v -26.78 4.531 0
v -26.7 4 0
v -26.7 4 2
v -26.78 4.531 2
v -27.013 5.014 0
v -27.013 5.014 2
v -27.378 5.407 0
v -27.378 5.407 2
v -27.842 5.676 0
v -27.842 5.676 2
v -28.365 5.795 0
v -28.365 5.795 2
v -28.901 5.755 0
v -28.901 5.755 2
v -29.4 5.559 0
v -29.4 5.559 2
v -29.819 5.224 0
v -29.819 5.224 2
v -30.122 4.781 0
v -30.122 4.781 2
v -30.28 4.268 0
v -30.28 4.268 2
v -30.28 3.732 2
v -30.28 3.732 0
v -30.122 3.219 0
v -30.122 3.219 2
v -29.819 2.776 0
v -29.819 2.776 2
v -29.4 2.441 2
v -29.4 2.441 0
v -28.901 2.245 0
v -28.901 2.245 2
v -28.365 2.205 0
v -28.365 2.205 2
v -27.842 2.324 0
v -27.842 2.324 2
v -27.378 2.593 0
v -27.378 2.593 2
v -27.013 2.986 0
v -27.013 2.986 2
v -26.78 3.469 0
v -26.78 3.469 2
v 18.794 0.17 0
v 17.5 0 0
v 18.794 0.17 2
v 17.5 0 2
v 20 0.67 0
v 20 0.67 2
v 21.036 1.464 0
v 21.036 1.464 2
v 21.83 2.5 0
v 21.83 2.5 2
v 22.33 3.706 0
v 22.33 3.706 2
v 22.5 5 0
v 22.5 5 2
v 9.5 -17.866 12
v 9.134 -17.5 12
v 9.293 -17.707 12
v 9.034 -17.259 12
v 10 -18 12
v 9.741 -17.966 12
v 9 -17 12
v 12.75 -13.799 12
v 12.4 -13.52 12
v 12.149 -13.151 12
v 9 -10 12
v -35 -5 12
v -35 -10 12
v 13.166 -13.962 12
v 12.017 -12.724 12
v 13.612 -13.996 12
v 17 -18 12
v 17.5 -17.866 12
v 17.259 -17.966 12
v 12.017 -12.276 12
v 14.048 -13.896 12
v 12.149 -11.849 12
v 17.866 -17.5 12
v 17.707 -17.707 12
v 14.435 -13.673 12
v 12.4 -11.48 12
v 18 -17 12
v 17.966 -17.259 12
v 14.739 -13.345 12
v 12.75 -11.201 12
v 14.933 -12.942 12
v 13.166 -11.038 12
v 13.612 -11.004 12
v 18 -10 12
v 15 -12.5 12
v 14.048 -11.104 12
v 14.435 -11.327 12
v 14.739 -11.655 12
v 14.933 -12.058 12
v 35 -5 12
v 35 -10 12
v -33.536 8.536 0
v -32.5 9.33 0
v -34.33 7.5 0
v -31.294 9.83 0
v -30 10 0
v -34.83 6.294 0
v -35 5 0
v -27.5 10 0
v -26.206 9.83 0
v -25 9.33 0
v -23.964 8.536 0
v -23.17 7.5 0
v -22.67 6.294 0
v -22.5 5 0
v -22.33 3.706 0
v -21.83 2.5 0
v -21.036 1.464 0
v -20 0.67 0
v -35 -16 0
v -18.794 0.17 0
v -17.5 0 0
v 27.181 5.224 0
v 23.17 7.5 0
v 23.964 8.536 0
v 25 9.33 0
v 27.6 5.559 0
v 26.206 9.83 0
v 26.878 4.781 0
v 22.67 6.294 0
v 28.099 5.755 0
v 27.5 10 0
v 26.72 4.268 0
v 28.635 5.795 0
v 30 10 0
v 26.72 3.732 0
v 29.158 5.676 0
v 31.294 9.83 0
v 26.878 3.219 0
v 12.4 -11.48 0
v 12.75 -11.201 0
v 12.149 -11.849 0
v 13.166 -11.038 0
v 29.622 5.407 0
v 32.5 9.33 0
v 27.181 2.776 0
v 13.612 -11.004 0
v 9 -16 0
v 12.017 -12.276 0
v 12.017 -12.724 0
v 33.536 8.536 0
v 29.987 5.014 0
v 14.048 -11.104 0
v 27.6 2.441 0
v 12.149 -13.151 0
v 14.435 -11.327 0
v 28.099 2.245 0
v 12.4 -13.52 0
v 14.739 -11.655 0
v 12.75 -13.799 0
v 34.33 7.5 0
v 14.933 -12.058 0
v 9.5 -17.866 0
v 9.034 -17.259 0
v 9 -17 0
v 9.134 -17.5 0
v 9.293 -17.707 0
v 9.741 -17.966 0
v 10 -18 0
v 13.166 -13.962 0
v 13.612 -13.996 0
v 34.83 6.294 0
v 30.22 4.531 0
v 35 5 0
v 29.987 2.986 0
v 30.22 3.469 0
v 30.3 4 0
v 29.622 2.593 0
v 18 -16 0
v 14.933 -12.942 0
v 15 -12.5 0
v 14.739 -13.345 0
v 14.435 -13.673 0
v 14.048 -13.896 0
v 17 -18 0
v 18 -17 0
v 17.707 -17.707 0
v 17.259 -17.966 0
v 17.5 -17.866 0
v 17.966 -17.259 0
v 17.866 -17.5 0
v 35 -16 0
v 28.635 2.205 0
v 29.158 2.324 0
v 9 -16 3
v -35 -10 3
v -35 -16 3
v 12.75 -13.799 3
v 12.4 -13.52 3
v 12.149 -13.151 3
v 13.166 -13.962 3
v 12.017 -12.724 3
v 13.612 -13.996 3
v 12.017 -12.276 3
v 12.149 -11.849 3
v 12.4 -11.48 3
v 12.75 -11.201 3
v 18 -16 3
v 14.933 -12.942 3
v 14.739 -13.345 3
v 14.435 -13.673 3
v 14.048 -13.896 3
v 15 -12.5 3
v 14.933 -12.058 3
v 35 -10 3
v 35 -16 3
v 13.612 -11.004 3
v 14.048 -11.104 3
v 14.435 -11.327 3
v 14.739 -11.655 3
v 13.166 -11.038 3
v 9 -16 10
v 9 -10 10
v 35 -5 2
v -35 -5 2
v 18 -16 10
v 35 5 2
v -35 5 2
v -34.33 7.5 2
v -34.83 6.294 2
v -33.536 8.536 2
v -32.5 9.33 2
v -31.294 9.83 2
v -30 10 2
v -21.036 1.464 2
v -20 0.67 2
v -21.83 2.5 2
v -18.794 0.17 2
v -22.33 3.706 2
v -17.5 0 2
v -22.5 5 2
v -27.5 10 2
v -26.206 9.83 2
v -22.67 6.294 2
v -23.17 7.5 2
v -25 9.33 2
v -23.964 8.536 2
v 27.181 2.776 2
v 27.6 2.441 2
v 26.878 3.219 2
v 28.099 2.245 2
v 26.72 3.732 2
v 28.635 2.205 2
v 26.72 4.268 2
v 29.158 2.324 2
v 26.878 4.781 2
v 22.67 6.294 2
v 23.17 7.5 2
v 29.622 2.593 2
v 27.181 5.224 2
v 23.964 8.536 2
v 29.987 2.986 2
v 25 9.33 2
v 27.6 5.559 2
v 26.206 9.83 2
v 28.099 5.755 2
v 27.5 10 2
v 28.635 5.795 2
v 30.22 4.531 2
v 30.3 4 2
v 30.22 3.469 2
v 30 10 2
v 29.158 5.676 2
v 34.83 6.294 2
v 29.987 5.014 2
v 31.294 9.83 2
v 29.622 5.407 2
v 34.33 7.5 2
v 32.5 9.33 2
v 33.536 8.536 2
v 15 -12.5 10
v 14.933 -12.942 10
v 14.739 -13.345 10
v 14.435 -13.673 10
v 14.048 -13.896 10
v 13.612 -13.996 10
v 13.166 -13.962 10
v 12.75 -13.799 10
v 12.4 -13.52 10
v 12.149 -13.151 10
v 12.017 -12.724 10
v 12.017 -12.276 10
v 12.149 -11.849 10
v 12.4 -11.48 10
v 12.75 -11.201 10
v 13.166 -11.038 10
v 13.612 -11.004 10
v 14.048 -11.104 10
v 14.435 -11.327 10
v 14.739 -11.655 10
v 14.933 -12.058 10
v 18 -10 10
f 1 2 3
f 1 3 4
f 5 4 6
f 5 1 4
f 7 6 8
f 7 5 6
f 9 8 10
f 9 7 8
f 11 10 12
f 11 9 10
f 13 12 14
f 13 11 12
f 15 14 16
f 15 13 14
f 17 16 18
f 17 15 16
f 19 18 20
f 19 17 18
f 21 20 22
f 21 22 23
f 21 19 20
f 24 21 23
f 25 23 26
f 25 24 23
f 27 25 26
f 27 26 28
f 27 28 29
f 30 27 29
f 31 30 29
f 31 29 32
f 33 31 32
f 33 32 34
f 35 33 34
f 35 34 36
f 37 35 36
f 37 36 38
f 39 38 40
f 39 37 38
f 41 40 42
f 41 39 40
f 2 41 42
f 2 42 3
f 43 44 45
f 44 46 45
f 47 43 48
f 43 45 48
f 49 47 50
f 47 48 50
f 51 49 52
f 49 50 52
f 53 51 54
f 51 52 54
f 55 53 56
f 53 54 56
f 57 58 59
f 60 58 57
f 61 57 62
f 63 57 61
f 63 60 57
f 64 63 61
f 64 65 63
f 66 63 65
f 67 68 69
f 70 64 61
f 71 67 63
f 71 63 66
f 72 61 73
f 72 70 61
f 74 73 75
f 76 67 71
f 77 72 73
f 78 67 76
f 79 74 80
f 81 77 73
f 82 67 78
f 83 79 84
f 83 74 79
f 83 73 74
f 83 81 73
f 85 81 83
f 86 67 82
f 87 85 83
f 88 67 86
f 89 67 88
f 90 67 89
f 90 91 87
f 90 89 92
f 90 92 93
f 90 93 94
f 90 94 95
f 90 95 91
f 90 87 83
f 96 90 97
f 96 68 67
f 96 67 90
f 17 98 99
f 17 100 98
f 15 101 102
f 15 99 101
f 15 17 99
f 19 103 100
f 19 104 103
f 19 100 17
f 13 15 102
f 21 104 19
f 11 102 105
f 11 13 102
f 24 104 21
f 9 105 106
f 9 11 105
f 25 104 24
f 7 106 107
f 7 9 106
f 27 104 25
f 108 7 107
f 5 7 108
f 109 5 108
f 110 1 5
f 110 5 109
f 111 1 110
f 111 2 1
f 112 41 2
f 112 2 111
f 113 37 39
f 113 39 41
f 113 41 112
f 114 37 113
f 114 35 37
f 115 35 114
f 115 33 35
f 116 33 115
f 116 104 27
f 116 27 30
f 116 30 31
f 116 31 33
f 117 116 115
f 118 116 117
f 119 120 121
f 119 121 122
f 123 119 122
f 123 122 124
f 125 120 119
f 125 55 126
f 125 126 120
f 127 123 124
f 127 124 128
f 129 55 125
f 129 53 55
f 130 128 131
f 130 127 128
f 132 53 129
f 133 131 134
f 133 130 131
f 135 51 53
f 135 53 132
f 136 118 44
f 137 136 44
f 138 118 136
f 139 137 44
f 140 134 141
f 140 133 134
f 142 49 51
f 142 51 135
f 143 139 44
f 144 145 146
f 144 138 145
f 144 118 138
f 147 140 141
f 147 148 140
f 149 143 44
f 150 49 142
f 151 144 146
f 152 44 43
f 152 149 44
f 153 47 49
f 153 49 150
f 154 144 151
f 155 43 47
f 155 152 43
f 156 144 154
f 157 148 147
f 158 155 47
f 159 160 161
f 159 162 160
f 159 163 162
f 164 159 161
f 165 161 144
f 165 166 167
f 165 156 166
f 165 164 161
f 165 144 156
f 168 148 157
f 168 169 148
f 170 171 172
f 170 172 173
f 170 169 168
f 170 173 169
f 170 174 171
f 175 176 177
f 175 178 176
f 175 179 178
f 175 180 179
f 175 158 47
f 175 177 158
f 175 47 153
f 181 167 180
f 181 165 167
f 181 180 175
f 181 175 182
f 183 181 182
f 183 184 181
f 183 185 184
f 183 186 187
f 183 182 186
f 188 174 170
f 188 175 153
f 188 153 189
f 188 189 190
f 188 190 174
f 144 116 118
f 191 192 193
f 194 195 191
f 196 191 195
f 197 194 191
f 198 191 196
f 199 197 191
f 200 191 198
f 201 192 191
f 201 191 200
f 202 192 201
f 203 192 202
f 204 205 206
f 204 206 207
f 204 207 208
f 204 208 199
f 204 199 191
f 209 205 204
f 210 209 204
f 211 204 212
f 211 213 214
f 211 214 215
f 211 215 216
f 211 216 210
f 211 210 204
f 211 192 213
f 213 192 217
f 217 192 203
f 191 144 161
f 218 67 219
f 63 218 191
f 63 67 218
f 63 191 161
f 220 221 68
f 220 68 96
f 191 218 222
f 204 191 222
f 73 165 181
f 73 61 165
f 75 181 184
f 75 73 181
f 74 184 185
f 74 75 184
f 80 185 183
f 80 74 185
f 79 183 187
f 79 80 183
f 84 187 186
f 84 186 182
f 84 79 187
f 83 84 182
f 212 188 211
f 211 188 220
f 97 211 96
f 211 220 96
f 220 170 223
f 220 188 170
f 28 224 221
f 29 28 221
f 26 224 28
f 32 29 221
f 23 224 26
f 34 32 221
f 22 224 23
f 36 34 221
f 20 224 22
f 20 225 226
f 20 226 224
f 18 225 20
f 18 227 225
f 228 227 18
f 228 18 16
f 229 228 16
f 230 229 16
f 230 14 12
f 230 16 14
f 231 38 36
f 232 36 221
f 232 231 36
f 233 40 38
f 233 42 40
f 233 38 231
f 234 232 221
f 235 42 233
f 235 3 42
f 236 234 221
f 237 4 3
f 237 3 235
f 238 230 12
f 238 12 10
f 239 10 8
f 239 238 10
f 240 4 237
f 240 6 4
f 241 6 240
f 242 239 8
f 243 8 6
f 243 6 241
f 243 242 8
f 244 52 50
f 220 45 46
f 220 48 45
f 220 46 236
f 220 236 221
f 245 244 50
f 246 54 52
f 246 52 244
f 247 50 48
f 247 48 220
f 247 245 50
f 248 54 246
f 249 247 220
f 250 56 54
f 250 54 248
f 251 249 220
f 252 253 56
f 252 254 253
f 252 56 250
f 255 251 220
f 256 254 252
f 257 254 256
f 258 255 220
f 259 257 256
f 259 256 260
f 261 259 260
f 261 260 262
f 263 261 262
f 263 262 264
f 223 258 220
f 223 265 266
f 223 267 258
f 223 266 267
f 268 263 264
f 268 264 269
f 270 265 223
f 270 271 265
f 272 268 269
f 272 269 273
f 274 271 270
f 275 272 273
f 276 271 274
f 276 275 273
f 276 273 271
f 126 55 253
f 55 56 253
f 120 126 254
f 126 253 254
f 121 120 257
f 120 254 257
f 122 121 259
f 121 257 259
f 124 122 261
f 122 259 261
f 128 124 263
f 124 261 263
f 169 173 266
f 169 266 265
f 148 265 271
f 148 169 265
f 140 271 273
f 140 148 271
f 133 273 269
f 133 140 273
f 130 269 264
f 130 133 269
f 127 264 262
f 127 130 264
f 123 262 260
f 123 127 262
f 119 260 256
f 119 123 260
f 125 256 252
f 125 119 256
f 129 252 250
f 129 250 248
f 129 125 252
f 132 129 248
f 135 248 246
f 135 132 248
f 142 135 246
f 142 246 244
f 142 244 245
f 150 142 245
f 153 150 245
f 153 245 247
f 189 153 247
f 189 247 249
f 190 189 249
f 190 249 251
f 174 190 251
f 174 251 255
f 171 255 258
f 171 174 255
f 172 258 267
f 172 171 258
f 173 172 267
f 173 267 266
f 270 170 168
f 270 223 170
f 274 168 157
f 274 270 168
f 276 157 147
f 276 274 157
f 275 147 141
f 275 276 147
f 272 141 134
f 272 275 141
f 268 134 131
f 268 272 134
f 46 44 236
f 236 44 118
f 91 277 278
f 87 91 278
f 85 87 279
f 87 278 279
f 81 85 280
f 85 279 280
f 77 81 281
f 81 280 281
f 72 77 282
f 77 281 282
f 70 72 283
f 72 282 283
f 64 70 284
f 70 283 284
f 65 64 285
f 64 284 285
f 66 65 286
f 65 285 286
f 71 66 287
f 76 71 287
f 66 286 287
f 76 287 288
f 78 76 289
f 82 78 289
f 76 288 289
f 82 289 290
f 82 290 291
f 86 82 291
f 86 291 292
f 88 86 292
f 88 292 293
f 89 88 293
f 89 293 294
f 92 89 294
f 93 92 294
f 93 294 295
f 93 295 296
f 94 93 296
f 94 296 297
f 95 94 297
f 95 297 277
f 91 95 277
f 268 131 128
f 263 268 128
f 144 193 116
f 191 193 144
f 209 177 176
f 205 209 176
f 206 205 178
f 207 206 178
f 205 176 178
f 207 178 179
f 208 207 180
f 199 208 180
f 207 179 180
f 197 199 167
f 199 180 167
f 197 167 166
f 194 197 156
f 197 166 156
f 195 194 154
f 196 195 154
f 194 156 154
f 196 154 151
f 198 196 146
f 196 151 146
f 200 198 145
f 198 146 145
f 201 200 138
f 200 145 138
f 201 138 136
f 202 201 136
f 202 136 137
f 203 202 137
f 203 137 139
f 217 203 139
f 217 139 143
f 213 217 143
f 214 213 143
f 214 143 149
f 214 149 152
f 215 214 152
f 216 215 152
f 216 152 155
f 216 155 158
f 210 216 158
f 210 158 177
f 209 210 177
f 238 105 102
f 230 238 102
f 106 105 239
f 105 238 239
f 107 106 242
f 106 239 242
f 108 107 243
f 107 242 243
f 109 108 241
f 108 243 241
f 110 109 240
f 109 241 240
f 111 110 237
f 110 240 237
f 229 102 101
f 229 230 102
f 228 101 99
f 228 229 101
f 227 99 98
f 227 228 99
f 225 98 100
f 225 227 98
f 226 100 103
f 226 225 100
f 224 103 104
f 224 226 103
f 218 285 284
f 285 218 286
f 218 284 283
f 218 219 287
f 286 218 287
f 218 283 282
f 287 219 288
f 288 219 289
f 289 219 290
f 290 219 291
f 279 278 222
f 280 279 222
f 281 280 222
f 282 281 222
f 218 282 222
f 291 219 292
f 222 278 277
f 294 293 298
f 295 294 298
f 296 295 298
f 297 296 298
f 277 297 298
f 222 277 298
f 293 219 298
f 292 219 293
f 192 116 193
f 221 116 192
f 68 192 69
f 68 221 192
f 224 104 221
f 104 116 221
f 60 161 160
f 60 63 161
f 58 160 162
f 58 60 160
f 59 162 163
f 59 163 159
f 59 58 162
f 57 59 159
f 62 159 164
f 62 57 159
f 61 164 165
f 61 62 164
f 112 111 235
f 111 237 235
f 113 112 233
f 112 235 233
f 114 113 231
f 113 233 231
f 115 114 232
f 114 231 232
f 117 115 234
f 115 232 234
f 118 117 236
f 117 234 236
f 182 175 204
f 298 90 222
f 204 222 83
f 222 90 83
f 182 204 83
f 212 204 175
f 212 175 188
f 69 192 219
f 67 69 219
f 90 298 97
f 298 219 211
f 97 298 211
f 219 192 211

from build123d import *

# Parameters (mm, degrees)
F0_R      = 1.8
F1_DEPTH  = 2
F2_R      = 4.99999
F3_W      = 70
F3_H      = 5
F4_DEPTH  = 10
F5_W      = 70
F5_H      = 3
F6_DEPTH  = 6
F8_W      = 9
F8_H      = 2
F9_DEPTH  = 8
F10_W     = 9
F10_H     = 2
F11_DEPTH = 10
F7_R      = 1.5
F12_DEPTH = 12.001
F13_R     = 1


# Not quite as in the source:
# - a fillet or chamfer is up to 0.001 mm smaller than in the source, because OpenCascade refuses the exact size


with BuildPart() as f1:
    # F0 (on Top) → F1 (new body)
    with BuildSketch(Plane.XY):
        Polygon((-22.5, 10), (-35, 10), (-35, -10), (35, -10), (35, 10), (22.5, 10), (22.5, 0), (0, 0), (-22.5, 0), align=None)
        with Locations((-28.5, 4)):
            Circle(F0_R, mode=Mode.SUBTRACT)
        with Locations((28.5, 4)):
            Circle(F0_R, mode=Mode.SUBTRACT)
    extrude(amount=F1_DEPTH)

    # F2 (radius 5 in the source; OpenCascade refuses exactly that, so slightly less here)
    f2_edges = [f1.edges().sort_by_distance(p)[0] for p in [
        (22.5, 10, 1),
        (35, 10, 1),
        (-22.5, 10, 1),
        (-35, 10, 1),
        (-22.5, 0, 1),
        (22.5, 0, 1),
    ]]
    fillet(f2_edges, radius=F2_R)

    # F3 (on face) → F4 (join)
    with BuildSketch(Plane.XY.offset(2)):
        with Locations((0, -7.5)):
            Rectangle(F3_W, F3_H)
    extrude(amount=F4_DEPTH)

    # F5 (on face) → F6 (join)
    with BuildSketch(Plane.XZ.offset(10)):
        with Locations((0, 1.5)):
            Rectangle(F5_W, F5_H)
    extrude(amount=F6_DEPTH)

    # F8 (on face) → F9 (join)
    with BuildSketch(Plane.XZ.offset(10)):
        with Locations((13.5, 11)):
            Rectangle(F8_W, F8_H)
    extrude(amount=F9_DEPTH)

    # F10 (on face) → F11 (join)
    with BuildSketch(Plane(origin=(0, 0, 10), x_dir=(1, 0, 0), z_dir=(0, 0, -1))):
        with Locations((13.5, 17)):
            Rectangle(F10_W, F10_H)
    extrude(amount=F11_DEPTH)

    # F7 (on face) → F12 (cut, through all)
    with BuildSketch(Plane(origin=(0, 0, 0), x_dir=(1, 0, 0), z_dir=(0, 0, -1))):
        with Locations((13.5, 12.5)):
            Circle(F7_R)
    extrude(amount=-F12_DEPTH, mode=Mode.SUBTRACT)

    # F13
    f13_edges = [f1.edges().sort_by_distance(p)[0] for p in [
        (9, -18, 6),
        (18, -18, 6),
    ]]
    fillet(f13_edges, radius=F13_R)


solid = f1.part
